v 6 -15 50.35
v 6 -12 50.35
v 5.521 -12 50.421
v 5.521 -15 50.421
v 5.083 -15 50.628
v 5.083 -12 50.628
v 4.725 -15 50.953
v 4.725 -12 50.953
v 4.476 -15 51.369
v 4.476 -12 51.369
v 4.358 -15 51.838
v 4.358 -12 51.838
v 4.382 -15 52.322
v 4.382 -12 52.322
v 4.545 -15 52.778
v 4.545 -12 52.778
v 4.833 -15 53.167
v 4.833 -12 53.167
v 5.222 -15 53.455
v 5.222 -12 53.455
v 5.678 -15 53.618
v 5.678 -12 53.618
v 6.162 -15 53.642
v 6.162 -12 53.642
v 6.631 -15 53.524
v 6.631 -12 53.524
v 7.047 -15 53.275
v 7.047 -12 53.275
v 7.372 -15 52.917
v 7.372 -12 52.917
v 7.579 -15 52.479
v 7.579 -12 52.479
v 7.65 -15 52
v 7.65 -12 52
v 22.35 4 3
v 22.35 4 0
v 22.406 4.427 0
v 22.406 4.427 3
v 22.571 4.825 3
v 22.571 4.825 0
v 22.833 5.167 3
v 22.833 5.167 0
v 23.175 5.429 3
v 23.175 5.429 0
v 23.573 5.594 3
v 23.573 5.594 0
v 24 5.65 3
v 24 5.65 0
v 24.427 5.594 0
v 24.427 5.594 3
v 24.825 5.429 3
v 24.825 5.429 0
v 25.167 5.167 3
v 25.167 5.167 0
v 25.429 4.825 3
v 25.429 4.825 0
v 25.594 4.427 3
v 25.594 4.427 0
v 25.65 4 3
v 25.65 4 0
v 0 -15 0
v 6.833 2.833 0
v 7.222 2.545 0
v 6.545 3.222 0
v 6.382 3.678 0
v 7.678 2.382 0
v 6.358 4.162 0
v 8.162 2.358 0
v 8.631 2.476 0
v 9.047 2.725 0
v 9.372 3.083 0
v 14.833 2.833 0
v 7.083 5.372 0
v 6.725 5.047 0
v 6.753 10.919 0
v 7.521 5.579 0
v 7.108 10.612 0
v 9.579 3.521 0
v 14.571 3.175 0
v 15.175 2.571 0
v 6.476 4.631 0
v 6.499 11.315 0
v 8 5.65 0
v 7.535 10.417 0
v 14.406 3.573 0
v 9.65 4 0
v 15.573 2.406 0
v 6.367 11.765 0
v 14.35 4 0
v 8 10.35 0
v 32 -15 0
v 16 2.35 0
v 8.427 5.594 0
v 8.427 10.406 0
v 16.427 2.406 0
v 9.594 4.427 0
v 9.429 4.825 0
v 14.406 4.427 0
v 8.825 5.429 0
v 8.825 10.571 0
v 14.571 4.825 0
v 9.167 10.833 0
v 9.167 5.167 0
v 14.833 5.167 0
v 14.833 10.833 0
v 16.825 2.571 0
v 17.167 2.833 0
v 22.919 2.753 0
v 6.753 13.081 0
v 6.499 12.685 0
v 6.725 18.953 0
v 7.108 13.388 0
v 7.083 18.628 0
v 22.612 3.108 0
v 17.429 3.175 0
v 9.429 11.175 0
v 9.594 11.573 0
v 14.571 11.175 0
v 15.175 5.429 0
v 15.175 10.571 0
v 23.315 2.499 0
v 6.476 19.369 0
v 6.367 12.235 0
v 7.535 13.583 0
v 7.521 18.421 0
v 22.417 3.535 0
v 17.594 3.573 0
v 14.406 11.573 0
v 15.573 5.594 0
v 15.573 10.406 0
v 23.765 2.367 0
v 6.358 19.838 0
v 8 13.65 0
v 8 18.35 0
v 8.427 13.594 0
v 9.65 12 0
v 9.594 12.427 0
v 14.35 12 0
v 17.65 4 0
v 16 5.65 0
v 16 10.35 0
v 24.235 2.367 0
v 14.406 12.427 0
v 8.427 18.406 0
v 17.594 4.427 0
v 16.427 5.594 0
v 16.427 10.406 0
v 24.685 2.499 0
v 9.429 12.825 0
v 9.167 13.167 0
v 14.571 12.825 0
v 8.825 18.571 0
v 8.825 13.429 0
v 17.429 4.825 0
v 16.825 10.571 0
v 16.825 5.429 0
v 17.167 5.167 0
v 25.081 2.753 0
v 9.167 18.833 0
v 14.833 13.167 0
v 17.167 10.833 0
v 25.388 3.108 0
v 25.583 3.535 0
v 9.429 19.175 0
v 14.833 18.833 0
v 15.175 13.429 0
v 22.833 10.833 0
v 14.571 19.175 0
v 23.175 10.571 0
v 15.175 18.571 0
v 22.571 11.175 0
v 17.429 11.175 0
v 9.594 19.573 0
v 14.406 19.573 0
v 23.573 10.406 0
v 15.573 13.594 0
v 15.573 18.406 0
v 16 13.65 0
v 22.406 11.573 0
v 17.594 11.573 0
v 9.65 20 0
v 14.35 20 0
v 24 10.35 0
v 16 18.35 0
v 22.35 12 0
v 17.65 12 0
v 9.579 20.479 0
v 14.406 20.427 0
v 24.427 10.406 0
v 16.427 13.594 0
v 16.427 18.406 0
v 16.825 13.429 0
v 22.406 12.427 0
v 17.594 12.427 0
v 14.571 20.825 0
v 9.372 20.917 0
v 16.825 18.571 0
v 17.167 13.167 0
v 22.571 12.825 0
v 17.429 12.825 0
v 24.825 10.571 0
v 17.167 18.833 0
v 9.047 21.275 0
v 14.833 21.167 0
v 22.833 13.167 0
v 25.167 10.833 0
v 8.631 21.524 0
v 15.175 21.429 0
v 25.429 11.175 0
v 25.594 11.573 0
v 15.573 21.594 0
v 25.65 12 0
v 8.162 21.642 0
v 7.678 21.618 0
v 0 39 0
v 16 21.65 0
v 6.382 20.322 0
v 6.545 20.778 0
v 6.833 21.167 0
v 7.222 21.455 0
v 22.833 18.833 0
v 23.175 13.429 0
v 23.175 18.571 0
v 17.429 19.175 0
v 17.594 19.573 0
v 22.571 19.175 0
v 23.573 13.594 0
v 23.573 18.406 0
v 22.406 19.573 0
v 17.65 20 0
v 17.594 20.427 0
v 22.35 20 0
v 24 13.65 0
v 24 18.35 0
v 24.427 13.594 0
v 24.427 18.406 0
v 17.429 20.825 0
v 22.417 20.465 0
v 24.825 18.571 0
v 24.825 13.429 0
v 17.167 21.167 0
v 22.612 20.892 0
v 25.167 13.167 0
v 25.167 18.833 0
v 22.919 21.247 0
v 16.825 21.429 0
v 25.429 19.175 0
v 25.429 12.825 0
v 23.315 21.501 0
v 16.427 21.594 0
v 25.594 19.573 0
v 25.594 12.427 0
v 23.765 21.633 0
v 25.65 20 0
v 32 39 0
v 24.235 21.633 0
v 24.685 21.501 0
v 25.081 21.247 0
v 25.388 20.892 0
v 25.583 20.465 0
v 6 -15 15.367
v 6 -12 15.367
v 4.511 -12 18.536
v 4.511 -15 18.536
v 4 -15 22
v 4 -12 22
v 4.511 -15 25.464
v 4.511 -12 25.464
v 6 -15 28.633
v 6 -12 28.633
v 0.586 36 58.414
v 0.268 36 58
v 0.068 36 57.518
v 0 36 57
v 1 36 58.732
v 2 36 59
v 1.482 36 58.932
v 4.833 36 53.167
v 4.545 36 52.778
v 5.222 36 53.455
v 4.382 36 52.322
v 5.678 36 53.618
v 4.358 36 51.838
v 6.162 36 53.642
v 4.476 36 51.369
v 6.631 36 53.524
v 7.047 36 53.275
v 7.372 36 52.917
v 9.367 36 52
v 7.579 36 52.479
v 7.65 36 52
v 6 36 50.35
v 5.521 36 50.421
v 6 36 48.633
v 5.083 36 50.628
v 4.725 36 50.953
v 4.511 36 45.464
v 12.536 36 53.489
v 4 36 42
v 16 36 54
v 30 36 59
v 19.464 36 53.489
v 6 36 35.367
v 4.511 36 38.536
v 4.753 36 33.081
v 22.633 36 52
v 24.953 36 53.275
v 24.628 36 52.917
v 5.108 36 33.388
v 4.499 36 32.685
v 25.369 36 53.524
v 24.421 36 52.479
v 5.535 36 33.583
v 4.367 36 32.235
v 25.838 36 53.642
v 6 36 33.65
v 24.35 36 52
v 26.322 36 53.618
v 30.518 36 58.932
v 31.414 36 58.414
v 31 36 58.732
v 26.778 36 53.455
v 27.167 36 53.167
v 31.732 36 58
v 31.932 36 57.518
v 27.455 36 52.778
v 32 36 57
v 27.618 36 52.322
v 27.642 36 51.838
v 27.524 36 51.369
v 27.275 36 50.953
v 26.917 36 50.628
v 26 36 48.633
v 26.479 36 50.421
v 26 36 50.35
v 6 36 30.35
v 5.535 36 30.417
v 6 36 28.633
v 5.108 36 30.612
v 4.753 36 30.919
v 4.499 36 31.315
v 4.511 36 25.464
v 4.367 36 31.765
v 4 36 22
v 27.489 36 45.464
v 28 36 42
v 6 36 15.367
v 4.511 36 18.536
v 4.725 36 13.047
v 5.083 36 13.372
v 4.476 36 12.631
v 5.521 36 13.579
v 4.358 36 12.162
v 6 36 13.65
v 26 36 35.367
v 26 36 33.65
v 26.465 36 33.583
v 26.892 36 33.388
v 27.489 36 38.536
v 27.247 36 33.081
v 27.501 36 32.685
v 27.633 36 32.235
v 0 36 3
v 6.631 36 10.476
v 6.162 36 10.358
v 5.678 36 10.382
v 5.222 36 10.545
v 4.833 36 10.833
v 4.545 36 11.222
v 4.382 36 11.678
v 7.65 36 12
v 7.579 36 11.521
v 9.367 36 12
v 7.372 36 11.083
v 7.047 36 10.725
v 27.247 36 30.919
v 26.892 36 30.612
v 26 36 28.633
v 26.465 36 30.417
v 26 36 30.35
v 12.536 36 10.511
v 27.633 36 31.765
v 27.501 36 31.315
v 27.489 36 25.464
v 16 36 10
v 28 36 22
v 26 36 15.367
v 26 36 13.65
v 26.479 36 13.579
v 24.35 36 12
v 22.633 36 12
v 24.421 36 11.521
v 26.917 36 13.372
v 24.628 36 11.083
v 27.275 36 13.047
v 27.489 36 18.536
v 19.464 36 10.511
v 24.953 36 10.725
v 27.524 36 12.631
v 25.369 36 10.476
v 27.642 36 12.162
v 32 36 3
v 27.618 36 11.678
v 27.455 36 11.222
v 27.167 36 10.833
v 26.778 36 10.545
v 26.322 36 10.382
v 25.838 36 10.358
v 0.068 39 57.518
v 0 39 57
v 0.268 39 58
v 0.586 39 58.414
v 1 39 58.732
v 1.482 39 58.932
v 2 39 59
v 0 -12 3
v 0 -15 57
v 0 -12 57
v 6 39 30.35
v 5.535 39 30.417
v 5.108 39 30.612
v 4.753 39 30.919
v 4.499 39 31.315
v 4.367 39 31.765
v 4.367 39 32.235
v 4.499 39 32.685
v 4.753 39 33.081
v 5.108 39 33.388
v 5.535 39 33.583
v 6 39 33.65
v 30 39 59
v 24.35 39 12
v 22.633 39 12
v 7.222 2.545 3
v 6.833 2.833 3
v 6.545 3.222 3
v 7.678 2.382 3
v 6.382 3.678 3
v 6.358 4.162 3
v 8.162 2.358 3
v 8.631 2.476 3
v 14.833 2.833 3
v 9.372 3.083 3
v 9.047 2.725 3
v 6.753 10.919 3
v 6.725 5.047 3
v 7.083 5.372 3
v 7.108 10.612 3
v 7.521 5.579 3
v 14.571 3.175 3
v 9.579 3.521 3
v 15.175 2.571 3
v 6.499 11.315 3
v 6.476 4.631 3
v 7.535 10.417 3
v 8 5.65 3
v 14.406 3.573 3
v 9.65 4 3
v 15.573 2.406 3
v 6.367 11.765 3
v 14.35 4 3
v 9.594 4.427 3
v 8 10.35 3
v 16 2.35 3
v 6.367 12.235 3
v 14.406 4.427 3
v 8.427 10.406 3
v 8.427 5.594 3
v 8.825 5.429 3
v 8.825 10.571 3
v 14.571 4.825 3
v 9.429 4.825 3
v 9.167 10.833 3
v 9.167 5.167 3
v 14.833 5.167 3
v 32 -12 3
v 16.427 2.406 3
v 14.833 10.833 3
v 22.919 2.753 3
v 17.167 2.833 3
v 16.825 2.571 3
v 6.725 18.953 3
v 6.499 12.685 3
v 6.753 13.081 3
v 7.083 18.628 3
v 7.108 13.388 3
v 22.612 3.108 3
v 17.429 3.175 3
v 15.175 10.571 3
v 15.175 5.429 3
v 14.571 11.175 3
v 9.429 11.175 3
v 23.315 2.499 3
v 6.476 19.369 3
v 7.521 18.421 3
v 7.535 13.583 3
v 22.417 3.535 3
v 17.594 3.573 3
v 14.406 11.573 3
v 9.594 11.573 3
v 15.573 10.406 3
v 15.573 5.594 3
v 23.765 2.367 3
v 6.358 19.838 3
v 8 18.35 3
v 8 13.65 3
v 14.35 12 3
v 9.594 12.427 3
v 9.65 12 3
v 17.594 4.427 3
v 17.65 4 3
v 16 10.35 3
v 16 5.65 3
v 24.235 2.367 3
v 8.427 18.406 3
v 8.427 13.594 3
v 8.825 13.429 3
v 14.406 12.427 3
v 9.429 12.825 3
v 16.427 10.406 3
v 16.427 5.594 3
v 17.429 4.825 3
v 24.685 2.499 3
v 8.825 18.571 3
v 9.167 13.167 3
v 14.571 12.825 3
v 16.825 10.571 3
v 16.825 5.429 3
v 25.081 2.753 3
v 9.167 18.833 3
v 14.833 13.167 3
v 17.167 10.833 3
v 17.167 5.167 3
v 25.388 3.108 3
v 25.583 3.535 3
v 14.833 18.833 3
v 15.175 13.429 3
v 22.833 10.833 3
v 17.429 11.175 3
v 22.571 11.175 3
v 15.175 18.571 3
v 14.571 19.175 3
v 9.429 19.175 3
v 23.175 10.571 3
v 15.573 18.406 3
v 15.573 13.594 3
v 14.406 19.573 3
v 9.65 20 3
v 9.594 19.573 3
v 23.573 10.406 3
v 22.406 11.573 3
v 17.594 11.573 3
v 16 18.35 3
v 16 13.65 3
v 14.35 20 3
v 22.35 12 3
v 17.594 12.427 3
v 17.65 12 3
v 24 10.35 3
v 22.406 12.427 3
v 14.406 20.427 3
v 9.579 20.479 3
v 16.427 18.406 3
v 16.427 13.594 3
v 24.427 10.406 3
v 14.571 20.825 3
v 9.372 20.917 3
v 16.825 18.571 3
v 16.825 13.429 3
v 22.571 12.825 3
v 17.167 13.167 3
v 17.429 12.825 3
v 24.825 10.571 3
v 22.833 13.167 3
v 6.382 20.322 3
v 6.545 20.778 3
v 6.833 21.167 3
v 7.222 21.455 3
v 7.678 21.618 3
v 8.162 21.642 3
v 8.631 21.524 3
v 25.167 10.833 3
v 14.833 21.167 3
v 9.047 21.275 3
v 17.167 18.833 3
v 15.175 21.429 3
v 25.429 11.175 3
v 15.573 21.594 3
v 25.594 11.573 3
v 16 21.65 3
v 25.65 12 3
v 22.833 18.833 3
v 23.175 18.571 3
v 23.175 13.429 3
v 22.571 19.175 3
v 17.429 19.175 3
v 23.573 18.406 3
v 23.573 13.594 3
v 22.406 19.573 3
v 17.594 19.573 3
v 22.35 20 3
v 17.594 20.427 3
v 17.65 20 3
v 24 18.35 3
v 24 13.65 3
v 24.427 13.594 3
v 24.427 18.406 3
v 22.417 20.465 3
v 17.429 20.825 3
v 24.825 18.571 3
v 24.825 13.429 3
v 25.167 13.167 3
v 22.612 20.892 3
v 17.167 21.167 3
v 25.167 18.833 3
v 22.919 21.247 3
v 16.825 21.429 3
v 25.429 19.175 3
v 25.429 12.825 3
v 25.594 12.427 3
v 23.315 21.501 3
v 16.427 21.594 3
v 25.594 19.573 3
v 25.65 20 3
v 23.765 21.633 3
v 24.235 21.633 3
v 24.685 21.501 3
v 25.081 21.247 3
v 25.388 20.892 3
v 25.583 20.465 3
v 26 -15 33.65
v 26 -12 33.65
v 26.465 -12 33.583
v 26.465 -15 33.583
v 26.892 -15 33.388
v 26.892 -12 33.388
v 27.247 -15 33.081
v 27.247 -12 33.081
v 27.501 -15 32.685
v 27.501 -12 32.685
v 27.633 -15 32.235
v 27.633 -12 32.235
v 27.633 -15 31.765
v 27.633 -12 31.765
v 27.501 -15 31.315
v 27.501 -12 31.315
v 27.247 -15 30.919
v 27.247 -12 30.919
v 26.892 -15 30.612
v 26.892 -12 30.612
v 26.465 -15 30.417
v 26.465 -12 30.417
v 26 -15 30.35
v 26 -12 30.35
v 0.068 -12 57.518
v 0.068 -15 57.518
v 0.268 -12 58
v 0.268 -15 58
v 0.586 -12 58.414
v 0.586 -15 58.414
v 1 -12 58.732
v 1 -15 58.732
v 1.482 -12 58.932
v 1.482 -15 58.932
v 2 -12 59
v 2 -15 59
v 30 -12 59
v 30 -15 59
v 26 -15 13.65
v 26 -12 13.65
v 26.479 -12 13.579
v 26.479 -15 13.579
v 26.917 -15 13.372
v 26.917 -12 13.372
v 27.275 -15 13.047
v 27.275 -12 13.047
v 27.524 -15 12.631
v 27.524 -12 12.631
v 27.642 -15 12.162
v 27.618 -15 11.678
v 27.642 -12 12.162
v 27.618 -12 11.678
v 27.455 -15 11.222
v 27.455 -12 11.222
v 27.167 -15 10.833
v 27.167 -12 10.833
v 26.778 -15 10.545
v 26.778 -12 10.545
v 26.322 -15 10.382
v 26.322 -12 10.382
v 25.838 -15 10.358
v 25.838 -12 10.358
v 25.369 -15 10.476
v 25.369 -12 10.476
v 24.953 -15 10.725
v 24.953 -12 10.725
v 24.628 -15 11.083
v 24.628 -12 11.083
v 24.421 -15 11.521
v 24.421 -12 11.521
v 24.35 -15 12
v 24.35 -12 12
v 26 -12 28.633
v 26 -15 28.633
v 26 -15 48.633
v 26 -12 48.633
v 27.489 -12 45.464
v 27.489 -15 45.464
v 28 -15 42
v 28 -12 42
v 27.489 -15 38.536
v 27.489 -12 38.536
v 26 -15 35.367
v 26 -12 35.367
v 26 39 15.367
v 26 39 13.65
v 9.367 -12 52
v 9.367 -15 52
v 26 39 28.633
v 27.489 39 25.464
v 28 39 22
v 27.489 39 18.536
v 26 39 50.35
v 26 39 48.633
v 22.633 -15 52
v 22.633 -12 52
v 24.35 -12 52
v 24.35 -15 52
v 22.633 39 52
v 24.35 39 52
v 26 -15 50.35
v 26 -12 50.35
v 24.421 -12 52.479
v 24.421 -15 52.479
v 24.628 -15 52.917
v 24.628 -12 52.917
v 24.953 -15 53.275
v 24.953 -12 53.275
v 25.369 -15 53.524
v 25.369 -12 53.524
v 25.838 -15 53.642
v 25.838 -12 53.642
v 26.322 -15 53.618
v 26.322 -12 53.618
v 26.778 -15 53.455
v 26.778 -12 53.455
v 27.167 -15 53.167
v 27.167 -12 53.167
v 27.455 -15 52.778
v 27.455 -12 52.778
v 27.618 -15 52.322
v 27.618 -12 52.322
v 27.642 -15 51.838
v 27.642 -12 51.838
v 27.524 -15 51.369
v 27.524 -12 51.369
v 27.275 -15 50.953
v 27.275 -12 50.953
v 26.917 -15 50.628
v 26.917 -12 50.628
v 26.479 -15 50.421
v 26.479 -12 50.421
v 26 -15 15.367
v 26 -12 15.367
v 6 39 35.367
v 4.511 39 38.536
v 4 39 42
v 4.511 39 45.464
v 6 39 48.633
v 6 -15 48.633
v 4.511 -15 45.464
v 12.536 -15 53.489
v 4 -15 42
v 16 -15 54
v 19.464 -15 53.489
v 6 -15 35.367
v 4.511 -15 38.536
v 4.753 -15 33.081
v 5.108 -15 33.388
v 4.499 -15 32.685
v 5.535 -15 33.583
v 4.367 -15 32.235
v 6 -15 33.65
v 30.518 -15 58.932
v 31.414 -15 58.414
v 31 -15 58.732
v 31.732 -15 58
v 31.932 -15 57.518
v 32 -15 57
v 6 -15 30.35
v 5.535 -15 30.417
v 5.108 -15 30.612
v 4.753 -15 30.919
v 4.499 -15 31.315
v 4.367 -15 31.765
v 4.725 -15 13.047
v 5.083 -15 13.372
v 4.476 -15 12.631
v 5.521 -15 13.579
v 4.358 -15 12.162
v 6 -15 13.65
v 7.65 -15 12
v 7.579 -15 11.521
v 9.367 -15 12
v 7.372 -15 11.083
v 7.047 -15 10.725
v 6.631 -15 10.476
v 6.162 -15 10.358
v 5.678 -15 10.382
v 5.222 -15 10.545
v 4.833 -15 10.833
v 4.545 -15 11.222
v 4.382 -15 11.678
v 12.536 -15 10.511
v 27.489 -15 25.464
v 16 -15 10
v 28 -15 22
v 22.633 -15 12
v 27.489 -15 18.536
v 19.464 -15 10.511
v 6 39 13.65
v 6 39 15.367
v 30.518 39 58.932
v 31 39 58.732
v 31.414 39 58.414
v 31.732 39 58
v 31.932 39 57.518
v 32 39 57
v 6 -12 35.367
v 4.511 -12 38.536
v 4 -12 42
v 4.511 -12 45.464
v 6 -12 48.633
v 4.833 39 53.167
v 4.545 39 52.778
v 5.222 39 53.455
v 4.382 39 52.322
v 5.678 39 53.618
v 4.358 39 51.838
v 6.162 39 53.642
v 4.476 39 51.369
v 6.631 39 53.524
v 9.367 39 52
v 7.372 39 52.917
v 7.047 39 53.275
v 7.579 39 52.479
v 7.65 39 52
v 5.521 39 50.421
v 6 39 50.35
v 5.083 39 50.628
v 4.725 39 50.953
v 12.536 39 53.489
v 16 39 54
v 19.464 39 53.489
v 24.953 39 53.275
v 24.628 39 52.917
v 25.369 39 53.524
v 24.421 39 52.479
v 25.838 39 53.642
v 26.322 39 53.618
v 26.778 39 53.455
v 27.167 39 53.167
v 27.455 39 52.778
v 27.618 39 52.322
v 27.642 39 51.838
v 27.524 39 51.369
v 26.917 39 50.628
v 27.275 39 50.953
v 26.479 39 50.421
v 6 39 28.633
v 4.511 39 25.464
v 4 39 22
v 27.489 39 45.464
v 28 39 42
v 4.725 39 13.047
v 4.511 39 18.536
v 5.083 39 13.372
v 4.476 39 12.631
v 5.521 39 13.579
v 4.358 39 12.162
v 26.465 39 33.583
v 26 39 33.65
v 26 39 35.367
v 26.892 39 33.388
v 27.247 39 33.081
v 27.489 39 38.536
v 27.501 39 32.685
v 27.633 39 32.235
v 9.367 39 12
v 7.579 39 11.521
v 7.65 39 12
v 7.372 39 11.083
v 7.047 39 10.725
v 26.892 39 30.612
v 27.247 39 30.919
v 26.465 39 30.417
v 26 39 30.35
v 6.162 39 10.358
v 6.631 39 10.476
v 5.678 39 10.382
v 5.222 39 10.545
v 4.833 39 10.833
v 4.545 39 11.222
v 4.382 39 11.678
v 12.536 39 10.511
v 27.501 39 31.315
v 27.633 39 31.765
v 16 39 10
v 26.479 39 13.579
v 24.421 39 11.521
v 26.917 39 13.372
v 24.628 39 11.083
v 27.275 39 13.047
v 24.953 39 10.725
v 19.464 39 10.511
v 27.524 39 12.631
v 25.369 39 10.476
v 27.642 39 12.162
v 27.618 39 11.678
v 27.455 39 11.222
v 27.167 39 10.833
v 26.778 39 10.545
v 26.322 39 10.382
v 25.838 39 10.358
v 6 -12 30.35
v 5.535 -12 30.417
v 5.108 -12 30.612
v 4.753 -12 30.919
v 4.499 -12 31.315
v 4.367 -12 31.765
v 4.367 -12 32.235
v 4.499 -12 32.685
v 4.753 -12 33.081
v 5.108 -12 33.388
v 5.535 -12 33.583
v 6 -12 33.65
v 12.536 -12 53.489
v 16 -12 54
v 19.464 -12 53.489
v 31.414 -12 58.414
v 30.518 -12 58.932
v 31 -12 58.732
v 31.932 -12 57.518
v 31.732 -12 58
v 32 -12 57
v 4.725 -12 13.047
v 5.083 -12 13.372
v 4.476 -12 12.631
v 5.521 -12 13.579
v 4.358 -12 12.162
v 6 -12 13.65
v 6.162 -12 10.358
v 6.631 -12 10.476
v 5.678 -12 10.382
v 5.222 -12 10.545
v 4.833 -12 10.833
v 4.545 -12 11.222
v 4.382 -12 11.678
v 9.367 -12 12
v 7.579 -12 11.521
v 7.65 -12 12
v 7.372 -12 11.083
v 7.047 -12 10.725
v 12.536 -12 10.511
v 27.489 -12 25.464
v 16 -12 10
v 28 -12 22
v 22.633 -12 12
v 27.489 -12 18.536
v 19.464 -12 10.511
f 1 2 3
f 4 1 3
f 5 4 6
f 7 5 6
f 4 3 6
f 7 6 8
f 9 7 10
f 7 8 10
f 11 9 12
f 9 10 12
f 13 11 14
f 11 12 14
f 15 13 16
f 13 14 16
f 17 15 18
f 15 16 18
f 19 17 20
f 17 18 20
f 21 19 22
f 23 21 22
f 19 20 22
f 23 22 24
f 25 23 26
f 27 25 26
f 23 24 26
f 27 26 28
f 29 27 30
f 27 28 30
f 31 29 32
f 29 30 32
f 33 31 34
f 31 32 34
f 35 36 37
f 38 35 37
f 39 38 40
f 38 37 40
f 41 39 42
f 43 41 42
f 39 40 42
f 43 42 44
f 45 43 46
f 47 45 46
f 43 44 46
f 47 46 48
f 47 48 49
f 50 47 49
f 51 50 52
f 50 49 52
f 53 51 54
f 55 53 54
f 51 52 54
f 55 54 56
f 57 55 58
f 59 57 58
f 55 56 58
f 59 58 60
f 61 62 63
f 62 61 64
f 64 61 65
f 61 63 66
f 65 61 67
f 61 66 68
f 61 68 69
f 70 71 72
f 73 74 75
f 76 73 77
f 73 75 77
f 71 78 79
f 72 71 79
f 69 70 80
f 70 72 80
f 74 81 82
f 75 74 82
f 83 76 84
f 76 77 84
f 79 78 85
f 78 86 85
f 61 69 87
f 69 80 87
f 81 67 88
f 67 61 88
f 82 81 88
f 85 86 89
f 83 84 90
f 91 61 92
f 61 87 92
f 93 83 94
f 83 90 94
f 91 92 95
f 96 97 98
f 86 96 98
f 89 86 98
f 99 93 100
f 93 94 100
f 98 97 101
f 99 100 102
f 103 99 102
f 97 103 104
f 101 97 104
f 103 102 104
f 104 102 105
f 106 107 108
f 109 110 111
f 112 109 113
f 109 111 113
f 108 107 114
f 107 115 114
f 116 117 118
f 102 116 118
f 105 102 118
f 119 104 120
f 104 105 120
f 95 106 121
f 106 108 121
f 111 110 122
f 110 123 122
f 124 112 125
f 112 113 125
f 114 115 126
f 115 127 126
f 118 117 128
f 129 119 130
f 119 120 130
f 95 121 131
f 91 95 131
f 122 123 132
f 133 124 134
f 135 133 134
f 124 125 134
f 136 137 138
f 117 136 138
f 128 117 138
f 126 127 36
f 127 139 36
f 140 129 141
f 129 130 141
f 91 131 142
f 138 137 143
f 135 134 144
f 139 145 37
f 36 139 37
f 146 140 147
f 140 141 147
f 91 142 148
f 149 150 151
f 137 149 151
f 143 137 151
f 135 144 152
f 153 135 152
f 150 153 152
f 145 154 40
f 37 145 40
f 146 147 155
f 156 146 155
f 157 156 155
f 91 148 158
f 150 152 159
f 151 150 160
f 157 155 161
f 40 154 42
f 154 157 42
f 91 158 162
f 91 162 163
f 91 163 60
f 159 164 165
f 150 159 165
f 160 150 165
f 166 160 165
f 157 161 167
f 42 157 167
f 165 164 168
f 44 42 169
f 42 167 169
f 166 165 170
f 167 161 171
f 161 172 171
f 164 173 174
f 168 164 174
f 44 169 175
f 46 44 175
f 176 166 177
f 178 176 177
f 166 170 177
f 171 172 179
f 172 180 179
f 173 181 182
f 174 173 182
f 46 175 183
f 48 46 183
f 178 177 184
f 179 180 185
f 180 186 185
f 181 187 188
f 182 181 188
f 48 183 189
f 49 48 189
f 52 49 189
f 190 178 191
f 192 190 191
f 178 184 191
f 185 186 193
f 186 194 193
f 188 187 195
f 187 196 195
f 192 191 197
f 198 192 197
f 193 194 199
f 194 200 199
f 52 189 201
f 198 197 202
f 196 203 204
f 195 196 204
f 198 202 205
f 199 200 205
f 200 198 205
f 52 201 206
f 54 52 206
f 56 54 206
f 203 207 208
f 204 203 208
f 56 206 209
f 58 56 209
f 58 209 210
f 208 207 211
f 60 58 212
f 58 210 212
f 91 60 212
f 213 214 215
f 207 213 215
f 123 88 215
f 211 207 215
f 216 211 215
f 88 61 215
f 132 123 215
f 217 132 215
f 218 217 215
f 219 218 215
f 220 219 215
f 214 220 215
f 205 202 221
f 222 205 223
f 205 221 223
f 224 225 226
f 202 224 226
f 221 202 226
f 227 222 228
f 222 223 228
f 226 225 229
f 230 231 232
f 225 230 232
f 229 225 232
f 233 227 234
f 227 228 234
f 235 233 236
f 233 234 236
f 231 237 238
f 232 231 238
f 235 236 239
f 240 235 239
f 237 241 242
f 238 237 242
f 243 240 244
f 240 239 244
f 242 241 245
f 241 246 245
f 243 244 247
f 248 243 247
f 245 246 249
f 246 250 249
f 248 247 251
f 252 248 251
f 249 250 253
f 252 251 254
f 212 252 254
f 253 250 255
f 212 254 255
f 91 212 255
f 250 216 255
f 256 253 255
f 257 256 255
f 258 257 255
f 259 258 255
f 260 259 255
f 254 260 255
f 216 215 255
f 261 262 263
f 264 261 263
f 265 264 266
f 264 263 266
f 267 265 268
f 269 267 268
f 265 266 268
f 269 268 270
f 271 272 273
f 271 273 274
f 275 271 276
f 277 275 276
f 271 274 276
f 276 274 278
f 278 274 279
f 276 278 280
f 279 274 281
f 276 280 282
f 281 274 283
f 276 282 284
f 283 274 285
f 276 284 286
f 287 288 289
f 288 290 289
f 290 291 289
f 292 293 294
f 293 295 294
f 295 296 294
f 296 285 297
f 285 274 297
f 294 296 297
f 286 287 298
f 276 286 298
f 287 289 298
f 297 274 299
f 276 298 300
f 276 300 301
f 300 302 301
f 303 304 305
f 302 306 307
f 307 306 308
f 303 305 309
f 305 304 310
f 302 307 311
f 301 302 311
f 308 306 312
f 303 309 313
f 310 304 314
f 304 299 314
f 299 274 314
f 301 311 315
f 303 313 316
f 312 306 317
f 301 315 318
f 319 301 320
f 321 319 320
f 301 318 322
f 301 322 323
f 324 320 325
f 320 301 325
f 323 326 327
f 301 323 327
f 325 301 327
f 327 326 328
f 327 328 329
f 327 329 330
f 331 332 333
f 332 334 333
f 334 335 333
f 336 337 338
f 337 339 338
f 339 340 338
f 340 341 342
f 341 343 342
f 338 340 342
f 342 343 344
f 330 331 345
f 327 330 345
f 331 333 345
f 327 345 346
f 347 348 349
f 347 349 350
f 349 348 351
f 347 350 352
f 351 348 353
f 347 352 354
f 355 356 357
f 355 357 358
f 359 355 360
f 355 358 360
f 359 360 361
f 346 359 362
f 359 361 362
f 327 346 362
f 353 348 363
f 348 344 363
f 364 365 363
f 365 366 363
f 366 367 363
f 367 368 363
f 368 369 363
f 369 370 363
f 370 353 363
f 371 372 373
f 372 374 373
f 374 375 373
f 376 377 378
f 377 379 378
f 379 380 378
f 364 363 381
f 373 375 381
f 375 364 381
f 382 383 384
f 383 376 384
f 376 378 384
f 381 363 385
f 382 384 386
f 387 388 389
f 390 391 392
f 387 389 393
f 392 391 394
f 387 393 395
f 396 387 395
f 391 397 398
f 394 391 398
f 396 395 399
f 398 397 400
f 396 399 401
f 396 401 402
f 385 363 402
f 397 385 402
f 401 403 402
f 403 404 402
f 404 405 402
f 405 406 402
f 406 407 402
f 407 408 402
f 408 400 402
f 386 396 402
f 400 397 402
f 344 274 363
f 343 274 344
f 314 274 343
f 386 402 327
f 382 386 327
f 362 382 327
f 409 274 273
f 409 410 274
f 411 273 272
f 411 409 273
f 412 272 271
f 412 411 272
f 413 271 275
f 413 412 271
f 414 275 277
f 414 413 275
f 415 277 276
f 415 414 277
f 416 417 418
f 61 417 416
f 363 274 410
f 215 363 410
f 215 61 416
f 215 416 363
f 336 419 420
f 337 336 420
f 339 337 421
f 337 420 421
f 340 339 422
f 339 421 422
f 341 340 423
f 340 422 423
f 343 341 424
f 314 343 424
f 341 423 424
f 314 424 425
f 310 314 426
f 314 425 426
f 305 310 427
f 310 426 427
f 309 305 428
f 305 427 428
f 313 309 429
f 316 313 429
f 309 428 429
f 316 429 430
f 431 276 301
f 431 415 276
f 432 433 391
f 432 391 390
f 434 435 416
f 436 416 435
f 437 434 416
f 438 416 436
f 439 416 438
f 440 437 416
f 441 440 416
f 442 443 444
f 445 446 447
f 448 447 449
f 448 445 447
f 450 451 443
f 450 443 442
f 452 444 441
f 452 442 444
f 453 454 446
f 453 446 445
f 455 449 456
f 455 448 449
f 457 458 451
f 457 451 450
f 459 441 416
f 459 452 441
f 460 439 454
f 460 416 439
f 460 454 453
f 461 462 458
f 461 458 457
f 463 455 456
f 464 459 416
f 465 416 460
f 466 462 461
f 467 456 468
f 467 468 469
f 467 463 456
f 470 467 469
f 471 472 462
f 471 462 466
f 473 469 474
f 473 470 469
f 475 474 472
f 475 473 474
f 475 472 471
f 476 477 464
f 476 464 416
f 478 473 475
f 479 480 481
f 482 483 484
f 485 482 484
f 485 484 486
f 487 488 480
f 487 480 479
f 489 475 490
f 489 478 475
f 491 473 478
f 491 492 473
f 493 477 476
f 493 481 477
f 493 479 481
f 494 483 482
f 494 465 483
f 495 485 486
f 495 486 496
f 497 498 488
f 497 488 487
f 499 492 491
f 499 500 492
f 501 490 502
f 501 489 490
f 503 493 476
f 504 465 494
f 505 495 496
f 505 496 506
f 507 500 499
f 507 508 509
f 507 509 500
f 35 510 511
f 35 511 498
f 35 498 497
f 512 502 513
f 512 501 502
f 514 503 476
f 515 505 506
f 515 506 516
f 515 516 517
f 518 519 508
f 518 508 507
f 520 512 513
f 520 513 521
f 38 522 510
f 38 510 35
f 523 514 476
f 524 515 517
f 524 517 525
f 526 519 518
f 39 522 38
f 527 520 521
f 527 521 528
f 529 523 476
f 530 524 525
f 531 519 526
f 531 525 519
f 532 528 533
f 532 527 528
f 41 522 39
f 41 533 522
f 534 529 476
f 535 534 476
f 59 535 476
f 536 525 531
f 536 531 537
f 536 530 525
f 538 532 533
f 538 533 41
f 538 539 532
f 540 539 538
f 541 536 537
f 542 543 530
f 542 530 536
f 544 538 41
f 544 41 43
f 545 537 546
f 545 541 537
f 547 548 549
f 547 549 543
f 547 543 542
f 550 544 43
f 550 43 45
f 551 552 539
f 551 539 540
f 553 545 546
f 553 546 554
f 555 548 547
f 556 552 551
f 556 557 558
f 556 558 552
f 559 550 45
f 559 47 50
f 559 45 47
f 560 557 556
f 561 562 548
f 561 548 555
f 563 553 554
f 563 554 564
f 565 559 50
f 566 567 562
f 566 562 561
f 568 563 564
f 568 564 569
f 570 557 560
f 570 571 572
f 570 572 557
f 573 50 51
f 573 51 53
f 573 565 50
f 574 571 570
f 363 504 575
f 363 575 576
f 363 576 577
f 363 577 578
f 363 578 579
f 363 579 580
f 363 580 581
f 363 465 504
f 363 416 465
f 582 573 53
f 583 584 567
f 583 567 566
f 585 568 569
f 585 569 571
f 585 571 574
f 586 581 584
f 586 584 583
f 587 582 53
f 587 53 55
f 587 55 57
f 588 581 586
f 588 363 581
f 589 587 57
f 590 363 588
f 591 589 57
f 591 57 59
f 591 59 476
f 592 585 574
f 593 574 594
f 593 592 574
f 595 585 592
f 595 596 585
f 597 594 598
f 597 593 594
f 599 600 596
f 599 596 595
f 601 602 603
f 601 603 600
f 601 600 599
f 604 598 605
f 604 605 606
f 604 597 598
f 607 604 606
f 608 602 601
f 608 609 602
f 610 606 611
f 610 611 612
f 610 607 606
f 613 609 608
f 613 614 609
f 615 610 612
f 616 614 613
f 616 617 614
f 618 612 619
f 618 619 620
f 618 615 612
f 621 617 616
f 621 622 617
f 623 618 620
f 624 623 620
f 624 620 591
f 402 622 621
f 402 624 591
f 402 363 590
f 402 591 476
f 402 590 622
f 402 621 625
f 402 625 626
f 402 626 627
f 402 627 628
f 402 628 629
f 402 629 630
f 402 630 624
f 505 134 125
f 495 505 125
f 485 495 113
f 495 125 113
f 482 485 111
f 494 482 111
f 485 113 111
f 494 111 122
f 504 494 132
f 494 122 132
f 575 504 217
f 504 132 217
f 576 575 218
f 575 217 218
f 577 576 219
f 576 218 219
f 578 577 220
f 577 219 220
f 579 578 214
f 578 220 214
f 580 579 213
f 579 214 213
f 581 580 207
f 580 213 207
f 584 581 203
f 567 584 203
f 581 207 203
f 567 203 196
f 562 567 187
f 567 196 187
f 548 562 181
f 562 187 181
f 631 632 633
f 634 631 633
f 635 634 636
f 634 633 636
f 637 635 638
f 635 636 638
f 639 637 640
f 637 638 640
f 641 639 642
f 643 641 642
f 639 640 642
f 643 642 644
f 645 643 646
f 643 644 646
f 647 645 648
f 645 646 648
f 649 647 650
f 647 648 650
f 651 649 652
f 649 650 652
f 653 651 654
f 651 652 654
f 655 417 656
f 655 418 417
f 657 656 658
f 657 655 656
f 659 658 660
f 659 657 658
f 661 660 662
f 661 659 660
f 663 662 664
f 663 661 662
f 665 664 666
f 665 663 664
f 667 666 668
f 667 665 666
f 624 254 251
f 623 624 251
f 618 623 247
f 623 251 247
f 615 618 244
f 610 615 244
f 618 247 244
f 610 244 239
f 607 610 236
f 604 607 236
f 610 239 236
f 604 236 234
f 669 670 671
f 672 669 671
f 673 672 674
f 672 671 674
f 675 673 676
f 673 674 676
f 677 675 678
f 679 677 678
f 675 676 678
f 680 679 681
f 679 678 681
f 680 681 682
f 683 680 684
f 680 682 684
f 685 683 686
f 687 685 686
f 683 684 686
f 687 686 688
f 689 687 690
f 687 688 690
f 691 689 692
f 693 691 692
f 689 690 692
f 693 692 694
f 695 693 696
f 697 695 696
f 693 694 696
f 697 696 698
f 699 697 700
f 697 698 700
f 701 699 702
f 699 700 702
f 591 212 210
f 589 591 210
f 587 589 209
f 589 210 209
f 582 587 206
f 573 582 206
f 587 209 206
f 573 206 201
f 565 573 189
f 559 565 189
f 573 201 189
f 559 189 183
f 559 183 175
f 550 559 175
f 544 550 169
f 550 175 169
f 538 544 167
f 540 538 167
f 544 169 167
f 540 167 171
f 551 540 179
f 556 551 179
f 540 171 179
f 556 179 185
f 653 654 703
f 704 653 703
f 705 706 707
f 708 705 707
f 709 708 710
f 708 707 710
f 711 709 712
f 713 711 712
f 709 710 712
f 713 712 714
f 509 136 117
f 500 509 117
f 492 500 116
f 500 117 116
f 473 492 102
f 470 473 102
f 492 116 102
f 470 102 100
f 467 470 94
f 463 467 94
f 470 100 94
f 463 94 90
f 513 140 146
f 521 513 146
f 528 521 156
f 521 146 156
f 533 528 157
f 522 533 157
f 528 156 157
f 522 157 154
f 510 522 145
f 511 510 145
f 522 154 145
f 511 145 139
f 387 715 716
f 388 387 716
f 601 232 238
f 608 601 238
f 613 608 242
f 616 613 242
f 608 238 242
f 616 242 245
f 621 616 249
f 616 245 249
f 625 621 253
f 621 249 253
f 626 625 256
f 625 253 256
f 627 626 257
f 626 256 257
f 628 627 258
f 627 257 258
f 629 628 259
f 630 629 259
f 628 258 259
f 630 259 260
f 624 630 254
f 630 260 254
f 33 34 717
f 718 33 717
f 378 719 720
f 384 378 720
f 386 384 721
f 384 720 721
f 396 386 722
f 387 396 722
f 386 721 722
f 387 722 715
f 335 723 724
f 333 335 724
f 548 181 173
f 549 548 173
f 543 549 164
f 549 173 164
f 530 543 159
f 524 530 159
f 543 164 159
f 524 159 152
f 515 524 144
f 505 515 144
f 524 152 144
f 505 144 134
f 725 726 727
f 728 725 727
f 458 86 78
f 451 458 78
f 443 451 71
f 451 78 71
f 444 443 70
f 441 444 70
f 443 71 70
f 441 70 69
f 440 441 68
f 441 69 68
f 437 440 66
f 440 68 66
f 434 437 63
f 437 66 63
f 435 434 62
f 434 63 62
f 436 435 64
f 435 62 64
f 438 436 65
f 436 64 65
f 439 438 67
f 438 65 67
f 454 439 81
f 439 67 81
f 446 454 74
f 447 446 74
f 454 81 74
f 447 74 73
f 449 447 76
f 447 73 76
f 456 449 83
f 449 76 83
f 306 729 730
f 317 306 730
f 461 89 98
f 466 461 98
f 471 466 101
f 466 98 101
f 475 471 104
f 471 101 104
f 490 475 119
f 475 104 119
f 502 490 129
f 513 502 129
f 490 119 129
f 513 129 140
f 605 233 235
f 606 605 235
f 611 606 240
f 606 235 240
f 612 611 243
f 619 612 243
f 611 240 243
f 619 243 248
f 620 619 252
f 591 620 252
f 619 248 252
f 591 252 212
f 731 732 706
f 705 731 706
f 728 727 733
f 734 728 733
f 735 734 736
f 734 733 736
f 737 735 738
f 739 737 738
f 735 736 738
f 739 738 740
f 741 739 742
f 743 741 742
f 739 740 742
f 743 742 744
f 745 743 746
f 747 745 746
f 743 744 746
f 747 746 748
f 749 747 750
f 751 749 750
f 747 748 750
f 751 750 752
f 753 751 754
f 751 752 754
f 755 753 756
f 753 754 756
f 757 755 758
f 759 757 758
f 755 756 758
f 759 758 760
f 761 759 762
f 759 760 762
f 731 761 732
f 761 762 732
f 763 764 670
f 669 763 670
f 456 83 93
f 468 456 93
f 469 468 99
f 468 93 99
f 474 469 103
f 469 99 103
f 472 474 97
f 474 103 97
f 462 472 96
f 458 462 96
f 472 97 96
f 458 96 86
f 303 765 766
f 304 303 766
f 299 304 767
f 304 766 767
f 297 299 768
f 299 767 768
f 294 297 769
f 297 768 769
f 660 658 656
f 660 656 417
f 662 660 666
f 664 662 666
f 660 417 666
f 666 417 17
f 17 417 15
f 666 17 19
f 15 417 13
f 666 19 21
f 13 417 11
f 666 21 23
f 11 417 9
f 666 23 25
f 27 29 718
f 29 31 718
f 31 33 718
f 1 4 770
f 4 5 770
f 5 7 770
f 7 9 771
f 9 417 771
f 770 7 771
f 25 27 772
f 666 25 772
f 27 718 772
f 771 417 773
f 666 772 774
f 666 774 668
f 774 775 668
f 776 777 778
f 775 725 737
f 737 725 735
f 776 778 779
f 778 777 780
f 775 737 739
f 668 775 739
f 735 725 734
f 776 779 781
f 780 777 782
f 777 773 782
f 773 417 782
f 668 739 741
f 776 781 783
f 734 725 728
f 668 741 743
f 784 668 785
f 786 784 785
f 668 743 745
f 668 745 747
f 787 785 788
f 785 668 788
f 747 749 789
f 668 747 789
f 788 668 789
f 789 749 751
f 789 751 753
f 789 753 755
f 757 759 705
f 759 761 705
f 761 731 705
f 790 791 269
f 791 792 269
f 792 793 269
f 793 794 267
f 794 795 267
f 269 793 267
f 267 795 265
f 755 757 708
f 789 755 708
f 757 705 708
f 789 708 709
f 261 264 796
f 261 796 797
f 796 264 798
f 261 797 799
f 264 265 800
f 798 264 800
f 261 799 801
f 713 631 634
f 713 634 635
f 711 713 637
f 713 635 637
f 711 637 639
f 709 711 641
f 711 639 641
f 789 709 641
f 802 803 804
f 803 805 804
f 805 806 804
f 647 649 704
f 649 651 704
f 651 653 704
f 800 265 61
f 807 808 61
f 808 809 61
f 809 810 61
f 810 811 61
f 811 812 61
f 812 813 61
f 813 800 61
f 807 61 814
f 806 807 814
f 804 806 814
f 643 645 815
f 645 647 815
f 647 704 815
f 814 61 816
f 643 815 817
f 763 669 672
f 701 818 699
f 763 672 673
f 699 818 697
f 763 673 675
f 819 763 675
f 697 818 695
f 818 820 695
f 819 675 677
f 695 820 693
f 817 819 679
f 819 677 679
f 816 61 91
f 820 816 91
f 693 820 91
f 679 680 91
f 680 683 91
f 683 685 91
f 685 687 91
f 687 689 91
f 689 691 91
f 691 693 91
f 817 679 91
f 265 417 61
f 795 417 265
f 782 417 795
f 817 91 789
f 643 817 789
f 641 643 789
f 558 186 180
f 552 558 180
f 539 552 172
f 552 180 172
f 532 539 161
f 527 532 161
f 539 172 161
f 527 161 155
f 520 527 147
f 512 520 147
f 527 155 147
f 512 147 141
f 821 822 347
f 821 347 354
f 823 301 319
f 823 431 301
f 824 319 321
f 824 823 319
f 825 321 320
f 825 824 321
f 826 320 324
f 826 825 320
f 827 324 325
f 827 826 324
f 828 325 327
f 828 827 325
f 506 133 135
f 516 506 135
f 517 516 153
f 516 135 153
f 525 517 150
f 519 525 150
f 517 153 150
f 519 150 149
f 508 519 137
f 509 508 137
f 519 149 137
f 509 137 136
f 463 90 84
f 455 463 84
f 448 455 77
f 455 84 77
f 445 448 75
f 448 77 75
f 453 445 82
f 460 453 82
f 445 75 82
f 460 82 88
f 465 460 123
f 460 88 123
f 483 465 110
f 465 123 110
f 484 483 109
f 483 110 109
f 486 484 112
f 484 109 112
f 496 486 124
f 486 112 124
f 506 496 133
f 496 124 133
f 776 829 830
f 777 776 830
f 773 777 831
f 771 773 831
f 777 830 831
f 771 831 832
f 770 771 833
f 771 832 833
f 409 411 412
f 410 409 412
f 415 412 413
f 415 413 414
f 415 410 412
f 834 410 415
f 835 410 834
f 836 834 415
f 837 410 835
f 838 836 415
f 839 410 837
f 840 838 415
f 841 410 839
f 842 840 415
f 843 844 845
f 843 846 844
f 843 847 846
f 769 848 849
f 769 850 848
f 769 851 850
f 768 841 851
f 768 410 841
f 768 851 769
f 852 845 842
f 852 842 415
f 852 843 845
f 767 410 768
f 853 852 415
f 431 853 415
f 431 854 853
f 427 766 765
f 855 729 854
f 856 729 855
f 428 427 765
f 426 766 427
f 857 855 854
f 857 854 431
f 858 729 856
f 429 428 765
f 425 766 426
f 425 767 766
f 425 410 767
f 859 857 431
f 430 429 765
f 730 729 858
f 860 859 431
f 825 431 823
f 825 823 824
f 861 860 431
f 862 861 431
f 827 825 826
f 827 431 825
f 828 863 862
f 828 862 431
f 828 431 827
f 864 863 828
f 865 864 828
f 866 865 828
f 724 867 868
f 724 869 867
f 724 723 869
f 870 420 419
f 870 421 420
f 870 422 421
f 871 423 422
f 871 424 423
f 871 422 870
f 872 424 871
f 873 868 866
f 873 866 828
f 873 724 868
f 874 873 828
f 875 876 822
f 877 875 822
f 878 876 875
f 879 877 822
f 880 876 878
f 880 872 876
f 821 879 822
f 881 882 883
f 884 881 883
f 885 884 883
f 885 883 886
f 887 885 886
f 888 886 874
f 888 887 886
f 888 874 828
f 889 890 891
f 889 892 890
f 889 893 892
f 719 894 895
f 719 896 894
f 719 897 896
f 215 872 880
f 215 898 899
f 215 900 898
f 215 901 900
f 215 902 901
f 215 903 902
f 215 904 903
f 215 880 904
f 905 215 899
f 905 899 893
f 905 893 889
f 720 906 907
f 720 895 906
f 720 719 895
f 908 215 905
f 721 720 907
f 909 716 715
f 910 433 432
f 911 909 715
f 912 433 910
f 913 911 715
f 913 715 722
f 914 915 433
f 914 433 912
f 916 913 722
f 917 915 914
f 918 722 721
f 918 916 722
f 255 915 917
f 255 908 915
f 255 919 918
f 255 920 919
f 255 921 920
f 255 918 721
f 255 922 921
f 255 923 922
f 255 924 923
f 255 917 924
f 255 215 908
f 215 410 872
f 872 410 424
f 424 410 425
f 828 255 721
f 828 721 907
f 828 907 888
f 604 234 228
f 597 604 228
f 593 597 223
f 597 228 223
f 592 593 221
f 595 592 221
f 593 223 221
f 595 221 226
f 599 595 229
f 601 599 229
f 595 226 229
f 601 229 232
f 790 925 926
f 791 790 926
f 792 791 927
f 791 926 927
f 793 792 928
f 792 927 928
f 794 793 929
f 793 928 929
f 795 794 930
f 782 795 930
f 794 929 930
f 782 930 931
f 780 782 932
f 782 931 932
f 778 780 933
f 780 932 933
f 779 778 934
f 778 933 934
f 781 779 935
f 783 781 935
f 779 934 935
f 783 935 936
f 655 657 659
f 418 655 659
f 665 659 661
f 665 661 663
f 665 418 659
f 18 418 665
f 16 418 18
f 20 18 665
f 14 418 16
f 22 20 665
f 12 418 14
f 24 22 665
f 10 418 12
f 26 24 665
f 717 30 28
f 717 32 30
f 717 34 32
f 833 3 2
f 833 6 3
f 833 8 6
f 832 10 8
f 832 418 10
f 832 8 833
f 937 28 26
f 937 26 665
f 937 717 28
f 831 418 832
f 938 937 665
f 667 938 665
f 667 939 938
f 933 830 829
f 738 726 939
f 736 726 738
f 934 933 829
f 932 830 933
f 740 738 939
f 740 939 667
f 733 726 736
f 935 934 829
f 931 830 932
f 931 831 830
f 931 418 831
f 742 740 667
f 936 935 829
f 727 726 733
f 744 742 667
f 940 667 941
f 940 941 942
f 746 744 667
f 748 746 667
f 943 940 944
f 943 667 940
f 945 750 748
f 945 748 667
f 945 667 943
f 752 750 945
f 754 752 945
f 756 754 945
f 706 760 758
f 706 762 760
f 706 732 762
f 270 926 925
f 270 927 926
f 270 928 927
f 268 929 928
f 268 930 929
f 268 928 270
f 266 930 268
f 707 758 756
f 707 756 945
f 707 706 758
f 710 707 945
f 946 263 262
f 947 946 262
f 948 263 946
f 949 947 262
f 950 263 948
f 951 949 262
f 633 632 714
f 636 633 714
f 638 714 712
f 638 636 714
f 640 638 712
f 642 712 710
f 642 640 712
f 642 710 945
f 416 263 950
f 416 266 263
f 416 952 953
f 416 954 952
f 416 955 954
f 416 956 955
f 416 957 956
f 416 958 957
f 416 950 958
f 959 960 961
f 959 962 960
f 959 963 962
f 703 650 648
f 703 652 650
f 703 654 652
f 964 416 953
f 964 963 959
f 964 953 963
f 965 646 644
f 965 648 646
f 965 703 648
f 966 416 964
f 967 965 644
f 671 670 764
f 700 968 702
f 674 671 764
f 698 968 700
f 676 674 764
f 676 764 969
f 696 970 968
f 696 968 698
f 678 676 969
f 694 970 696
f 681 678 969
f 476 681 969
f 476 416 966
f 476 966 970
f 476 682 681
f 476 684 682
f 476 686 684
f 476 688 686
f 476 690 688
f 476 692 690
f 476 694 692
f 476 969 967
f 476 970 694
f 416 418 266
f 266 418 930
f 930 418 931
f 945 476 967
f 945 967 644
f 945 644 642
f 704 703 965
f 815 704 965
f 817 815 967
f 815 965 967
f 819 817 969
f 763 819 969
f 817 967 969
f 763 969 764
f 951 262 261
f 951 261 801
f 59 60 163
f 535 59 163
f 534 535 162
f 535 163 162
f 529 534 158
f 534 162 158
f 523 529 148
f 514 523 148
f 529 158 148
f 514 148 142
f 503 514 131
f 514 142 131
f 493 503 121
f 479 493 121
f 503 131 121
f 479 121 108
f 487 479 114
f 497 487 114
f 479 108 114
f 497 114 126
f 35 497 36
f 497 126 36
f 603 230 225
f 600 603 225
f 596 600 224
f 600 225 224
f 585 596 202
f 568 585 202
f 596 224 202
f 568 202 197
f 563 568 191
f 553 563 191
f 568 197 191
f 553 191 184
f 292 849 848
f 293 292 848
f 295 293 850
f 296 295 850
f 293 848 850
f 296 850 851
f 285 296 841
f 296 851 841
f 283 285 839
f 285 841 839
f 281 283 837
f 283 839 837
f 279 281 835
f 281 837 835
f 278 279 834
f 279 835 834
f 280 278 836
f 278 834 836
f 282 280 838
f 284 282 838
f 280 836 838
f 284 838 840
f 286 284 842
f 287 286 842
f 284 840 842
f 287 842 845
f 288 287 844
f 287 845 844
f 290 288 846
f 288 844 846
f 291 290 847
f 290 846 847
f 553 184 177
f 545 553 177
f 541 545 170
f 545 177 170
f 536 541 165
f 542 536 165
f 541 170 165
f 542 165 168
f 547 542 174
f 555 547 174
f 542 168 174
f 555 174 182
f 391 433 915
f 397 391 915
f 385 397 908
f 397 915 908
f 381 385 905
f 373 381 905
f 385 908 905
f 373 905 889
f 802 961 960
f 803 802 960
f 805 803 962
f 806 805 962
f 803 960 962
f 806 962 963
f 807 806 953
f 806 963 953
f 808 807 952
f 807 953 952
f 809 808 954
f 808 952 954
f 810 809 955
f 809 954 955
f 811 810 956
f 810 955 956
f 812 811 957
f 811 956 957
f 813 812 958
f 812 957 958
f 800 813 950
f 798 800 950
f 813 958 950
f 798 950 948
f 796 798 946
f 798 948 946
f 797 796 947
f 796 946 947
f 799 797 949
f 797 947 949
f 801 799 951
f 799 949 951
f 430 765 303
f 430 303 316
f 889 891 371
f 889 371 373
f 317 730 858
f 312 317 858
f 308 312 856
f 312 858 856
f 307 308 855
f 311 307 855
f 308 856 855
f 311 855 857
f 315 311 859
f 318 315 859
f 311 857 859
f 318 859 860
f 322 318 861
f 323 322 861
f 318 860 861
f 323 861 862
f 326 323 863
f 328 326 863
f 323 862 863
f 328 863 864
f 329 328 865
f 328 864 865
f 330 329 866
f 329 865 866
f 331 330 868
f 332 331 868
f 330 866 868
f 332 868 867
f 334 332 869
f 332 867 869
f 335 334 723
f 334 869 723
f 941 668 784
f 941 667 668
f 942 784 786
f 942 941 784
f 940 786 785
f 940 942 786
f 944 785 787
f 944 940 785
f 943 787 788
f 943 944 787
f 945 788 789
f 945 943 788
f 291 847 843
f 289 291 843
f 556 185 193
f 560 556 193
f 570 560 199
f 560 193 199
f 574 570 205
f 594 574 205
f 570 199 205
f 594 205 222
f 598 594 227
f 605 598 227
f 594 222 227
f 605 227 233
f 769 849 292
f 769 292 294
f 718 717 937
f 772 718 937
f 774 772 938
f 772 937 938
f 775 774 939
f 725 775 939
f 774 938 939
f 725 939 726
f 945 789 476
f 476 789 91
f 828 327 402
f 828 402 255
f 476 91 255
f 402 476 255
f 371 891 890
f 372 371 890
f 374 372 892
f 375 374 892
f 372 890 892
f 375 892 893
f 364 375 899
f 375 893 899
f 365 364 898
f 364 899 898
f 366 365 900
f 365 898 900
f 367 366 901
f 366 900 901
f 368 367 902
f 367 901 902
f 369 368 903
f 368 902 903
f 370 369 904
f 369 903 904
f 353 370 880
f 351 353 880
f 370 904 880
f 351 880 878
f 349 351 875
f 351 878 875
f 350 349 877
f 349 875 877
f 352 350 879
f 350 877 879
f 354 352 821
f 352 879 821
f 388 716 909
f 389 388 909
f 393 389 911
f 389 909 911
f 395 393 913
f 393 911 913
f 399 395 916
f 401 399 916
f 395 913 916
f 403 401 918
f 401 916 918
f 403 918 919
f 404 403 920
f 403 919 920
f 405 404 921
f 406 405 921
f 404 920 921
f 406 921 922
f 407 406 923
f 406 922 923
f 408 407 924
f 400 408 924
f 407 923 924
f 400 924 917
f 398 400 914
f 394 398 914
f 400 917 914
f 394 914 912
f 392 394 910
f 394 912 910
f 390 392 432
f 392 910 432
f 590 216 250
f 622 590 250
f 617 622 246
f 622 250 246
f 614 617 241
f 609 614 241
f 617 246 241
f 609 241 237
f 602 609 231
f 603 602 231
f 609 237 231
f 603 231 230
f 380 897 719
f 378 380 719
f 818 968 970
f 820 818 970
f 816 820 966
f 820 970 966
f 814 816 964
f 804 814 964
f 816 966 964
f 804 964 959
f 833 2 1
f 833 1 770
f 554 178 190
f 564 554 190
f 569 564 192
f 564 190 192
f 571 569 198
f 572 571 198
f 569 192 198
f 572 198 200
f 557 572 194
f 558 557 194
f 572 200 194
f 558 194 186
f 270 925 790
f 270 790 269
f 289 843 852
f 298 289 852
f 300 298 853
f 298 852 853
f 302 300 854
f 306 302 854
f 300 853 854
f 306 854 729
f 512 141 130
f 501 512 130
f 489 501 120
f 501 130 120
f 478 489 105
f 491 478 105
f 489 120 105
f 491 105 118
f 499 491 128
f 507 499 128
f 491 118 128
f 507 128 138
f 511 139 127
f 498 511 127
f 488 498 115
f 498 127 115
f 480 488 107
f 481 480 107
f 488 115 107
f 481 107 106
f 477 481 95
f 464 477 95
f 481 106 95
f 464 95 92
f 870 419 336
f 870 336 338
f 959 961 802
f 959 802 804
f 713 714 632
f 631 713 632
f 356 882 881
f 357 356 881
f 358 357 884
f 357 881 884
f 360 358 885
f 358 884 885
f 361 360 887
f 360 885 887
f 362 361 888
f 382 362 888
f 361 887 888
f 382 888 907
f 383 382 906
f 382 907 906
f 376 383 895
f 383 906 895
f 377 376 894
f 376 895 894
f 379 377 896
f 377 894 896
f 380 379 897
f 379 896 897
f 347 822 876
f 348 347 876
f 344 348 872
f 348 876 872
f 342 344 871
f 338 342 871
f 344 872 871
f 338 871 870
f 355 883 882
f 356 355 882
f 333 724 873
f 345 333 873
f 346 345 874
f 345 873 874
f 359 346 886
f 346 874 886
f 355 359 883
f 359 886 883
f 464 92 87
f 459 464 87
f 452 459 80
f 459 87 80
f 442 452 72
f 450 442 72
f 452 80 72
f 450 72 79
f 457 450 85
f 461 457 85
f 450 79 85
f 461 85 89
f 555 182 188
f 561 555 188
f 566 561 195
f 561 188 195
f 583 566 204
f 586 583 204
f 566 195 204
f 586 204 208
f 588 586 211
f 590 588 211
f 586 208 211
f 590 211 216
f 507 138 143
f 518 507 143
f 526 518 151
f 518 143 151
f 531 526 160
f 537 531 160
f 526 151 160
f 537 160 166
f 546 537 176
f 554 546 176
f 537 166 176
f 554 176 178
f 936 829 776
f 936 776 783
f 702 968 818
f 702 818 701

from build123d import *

# Parameters (mm, degrees)
EXTRUDE_1_DEPTH     = 3
SKETCH_2_W          = 32
SKETCH_2_H          = 3
EXTRUDE_2_DEPTH     = 56
SKETCH_3_R          = 1.65
SKETCH_3_R_2        = 12
SKETCH_3_W          = 20
SKETCH_3_H          = 40
CUT_EXTRUDE_2_DEPTH = 58
FILLET_1_R          = 2


with BuildPart() as part:
    # 草图1 → 凸台-拉伸1 (new body)
    with BuildSketch(Plane.XY):
        with BuildLine():
            Line((0, 12), (0, 0))
            Line((0, 0), (0, -15))
            Line((0, -15), (16, -15))
            Line((16, -15), (16, 2.35))
            ThreePointArc((16, 2.35), (14.833273811, 2.833273811), (14.35, 4))
            Line((14.35, 4), (9.65, 4))
            ThreePointArc((9.65, 4), (6.833273811, 2.833273811), (8, 5.65))
            Line((8, 5.65), (8, 10.35))
            ThreePointArc((8, 10.35), (6.35, 12), (8, 13.65))
            Line((8, 13.65), (8, 18.35))
            ThreePointArc((8, 18.35), (6.833273811, 21.166726189), (9.65, 20))
            Line((9.65, 20), (14.35, 20))
            ThreePointArc((14.35, 20), (14.833273811, 21.166726189), (16, 21.65))
            Line((16, 21.65), (16, 39))
            Line((16, 39), (0, 39))
            Line((0, 39), (0, 24))
            Line((0, 24), (0, 12))
        make_face()
        with BuildLine():
            Line((32, 39), (16, 39))
            Line((16, 39), (16, 21.65))
            ThreePointArc((16, 21.65), (17.166726189, 21.166726189), (17.65, 20))
            Line((17.65, 20), (22.35, 20))
            ThreePointArc((22.35, 20), (24, 21.65), (25.65, 20))
            ThreePointArc((25.65, 20), (25.166726189, 18.833273811), (24, 18.35))
            Line((24, 18.35), (24, 13.65))
            ThreePointArc((24, 13.65), (25.166726189, 13.166726189), (25.65, 12))
            Line((25.65, 12), (32, 12))
            Line((32, 12), (32, 24))
            Line((32, 24), (32, 39))
        make_face()
        with BuildLine():
            Line((16, 2.35), (16, -15))
            Line((16, -15), (32, -15))
            Line((32, -15), (32, 0))
            Line((32, 0), (32, 12))
            Line((32, 12), (25.65, 12))
            ThreePointArc((25.65, 12), (25.166726189, 10.833273811), (24, 10.35))
            Line((24, 10.35), (24, 5.65))
            ThreePointArc((24, 5.65), (25.166726189, 5.166726189), (25.65, 4))
            ThreePointArc((25.65, 4), (24, 2.35), (22.35, 4))
            Line((22.35, 4), (17.65, 4))
            ThreePointArc((17.65, 4), (17.166726189, 2.833273811), (16, 2.35))
        make_face()
        with BuildLine():
            ThreePointArc((16, 18.35), (14.833273811, 18.833273811), (14.35, 20))
            Line((14.35, 20), (9.65, 20))
            ThreePointArc((9.65, 20), (9.166726189, 18.833273811), (8, 18.35))
            Line((8, 18.35), (8, 13.65))
            ThreePointArc((8, 13.65), (9.166726189, 13.166726189), (9.65, 12))
            Line((9.65, 12), (14.35, 12))
            ThreePointArc((14.35, 12), (14.833273811, 13.166726189), (16, 13.65))
            Line((16, 13.65), (16, 18.35))
        make_face()
        with BuildLine():
            Line((22.35, 20), (17.65, 20))
            ThreePointArc((17.65, 20), (17.166726189, 18.833273811), (16, 18.35))
            Line((16, 18.35), (16, 13.65))
            ThreePointArc((16, 13.65), (17.166726189, 13.166726189), (17.65, 12))
            Line((17.65, 12), (22.35, 12))
            ThreePointArc((22.35, 12), (22.833273811, 13.166726189), (24, 13.65))
            Line((24, 13.65), (24, 18.35))
            ThreePointArc((24, 18.35), (22.833273811, 18.833273811), (22.35, 20))
        make_face()
        with BuildLine():
            Line((9.65, 4), (14.35, 4))
            ThreePointArc((14.35, 4), (14.833273811, 5.166726189), (16, 5.65))
            Line((16, 5.65), (16, 10.35))
            ThreePointArc((16, 10.35), (14.833273811, 10.833273811), (14.35, 12))
            Line((14.35, 12), (9.65, 12))
            ThreePointArc((9.65, 12), (9.166726189, 10.833273811), (8, 10.35))
            Line((8, 10.35), (8, 5.65))
            ThreePointArc((8, 5.65), (9.166726189, 5.166726189), (9.65, 4))
        make_face()
        with BuildLine():
            ThreePointArc((16, 5.65), (17.166726189, 5.166726189), (17.65, 4))
            Line((17.65, 4), (22.35, 4))
            ThreePointArc((22.35, 4), (22.833273811, 5.166726189), (24, 5.65))
            Line((24, 5.65), (24, 10.35))
            ThreePointArc((24, 10.35), (22.833273811, 10.833273811), (22.35, 12))
            Line((22.35, 12), (17.65, 12))
            ThreePointArc((17.65, 12), (17.166726189, 10.833273811), (16, 10.35))
            Line((16, 10.35), (16, 5.65))
        make_face()
    extrude(amount=EXTRUDE_1_DEPTH)

    # 草图2 → 凸台-拉伸2 (add)
    with BuildSketch(Plane.XY.offset(3)):
        with Locations((16, 37.5)):
            Rectangle(SKETCH_2_W, SKETCH_2_H)
        with Locations((16, -13.5)):
            Rectangle(SKETCH_2_W, SKETCH_2_H)
    extrude(amount=EXTRUDE_2_DEPTH)

    # 草图3 → 切除-拉伸2 (cut)
    with BuildSketch(Plane(origin=(0, 39, 0), x_dir=(1, 0, 0), z_dir=(0, 1, 0))):
        with Locations((6, -52)):
            Circle(SKETCH_3_R)
        with Locations((6, -32)):
            Circle(SKETCH_3_R)
        with Locations((6, -12)):
            Circle(SKETCH_3_R)
        with Locations((26, -12)):
            Circle(SKETCH_3_R)
        with Locations((26, -52)):
            Circle(SKETCH_3_R)
        with Locations((26, -32)):
            Circle(SKETCH_3_R)
        with Locations((16, -42)):
            Circle(SKETCH_3_R_2)
        with Locations((16, -22)):
            Circle(SKETCH_3_R_2)
        with Locations((16, -32)):
            Rectangle(SKETCH_3_W, SKETCH_3_H)
    extrude(amount=-CUT_EXTRUDE_2_DEPTH, mode=Mode.SUBTRACT)

    # 圆角1
    fillet_1_edges = [part.edges().sort_by_distance(p)[0] for p in [
        (0, 37.5, 59),
        (32, 37.5, 59),
        (32, -13.5, 59),
        (0, -13.5, 59),
    ]]
    fillet(fillet_1_edges, radius=FILLET_1_R)


solid = part.part
